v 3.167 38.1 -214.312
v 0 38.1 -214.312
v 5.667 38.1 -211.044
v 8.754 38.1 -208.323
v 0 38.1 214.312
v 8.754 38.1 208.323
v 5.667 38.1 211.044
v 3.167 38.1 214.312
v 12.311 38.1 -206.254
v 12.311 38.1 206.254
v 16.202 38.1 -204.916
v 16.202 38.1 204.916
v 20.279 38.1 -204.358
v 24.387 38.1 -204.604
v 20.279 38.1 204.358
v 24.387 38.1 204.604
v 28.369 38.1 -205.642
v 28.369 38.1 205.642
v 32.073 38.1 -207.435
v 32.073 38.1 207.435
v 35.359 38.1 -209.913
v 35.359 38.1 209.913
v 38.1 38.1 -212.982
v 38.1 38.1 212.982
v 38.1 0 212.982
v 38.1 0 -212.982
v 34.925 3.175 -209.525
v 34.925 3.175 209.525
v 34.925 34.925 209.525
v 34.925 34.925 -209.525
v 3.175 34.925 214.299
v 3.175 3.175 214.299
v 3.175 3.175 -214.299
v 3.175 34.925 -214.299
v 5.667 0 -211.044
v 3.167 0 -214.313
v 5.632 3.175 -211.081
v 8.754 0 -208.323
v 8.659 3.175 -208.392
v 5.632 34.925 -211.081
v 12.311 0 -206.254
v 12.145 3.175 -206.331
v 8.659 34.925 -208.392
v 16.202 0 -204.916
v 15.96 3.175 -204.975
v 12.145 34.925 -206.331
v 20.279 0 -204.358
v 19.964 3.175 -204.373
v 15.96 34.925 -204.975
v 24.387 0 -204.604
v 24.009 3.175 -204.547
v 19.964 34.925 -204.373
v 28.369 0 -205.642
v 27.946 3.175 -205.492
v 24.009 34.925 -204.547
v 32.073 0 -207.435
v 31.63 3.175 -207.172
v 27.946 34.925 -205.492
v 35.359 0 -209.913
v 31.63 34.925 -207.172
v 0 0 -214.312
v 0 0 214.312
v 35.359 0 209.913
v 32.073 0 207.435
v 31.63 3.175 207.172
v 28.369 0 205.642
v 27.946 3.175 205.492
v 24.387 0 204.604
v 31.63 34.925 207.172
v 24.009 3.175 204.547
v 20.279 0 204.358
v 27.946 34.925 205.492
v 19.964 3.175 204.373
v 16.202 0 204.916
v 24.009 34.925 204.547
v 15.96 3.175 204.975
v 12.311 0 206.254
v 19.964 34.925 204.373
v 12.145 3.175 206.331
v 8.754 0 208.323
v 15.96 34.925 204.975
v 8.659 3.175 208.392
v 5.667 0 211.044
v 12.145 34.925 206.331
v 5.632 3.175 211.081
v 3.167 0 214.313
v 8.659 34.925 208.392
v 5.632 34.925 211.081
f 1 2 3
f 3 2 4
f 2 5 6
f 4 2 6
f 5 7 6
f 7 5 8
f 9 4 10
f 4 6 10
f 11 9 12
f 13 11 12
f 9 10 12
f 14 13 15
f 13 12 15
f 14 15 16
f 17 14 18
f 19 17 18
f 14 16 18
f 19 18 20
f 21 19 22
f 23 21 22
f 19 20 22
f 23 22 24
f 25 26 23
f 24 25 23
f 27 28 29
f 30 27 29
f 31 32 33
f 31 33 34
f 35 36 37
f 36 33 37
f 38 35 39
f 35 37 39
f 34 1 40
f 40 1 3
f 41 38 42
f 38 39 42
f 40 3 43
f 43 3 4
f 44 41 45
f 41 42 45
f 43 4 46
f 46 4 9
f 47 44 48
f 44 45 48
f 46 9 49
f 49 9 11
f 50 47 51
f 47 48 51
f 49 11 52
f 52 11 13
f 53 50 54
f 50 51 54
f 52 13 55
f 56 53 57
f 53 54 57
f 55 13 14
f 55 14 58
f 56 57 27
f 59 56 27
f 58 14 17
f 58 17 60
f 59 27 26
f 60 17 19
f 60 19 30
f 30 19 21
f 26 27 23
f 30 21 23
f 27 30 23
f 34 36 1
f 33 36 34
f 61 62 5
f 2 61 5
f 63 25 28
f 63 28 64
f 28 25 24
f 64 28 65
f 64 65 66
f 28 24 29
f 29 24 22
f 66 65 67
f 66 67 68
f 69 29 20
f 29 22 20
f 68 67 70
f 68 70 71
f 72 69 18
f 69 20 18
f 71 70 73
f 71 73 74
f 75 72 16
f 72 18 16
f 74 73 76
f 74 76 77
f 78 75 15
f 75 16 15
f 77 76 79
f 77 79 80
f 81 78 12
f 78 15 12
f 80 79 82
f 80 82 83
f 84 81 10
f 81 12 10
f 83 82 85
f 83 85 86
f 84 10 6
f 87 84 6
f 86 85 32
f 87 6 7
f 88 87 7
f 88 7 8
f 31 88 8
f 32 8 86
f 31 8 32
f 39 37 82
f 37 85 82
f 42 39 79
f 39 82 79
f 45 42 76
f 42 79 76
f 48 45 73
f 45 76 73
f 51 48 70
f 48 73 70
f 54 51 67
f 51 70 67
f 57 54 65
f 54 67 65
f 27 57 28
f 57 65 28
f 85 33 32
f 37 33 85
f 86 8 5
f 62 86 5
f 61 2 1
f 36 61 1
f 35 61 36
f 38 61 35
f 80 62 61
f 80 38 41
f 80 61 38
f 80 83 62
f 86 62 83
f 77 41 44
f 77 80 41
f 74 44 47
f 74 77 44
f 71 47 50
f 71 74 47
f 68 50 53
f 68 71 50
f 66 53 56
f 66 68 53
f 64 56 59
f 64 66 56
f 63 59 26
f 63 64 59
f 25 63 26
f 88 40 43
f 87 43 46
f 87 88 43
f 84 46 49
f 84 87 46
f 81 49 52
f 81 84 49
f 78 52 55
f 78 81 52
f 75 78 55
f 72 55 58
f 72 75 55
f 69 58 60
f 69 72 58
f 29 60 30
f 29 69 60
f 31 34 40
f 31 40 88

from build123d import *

# Parameters (mm, degrees)
SKETCH2_W                = 38.1
SKETCH2_H                = 38.1
SKETCH2_W_2              = 31.75
SKETCH2_H_2              = 31.75
BOSS_EXTRUDE1_DEPTH      = 762
BOSS_EXTRUDE1_DEPTH_BACK = 762
SKETCH3_R                = 21.082
CUT_EXTRUDE1_DEPTH       = 764.902624685
CUT_EXTRUDE2_DEPTH       = 232.775000254


with BuildPart() as part:
    # Sketch2 → Boss-Extrude1 (new, two sides)
    with BuildSketch(Plane.XY) as boss_extrude1_sk:
        with Locations((19.05, 19.05)):
            Rectangle(SKETCH2_W, SKETCH2_H)
        with Locations((19.05, 19.05)):
            Rectangle(SKETCH2_W_2, SKETCH2_H_2, mode=Mode.SUBTRACT)
    extrude(amount=BOSS_EXTRUDE1_DEPTH)
    extrude(boss_extrude1_sk.sketch, amount=-BOSS_EXTRUDE1_DEPTH_BACK)

    # Sketch3 → Cut-Extrude1 (cut, through all)
    with BuildSketch(Plane(origin=(0, 38.1, 0), x_dir=(1, 0, 0), z_dir=(0, 1, 0))):
        with Locations((21.082, -225.425)):
            Circle(SKETCH3_R)
        with Locations((21.082, 225.425)):
            Circle(SKETCH3_R)
    extrude(amount=-CUT_EXTRUDE1_DEPTH, mode=Mode.SUBTRACT)


with BuildPart() as cut_extrude1_kept_piece:
    # of the separate pieces the step leaves, the one the design keeps (cut_extrude1_pieces_kept)
    add(part.part.solids().sort_by_distance((38.1, 38.1, 212.981592107))[0])

    # Sketch4 → Cut-Extrude2 (cut, through all)
    with BuildSketch(Plane(origin=(0, 38.1, 0), x_dir=(1, 0, 0), z_dir=(0, 1, 0))):
        with BuildLine():
            Line((0, -214.3125), (0, -225.425))
            ThreePointArc((0, -225.425), (0.807088464, -219.647570969), (3.166557841, -214.3125))
            Line((3.166557841, -214.3125), (0, -214.3125))
        make_face()
        with BuildLine():
            Line((0, 225.425), (0, 214.3125))
            Line((0, 214.3125), (3.166557841, 214.3125))
            ThreePointArc((3.166557841, 214.3125), (0.807088464, 219.647570969), (0, 225.425))
        make_face()
    extrude(amount=-CUT_EXTRUDE2_DEPTH, mode=Mode.SUBTRACT)


solid = cut_extrude1_kept_piece.part
